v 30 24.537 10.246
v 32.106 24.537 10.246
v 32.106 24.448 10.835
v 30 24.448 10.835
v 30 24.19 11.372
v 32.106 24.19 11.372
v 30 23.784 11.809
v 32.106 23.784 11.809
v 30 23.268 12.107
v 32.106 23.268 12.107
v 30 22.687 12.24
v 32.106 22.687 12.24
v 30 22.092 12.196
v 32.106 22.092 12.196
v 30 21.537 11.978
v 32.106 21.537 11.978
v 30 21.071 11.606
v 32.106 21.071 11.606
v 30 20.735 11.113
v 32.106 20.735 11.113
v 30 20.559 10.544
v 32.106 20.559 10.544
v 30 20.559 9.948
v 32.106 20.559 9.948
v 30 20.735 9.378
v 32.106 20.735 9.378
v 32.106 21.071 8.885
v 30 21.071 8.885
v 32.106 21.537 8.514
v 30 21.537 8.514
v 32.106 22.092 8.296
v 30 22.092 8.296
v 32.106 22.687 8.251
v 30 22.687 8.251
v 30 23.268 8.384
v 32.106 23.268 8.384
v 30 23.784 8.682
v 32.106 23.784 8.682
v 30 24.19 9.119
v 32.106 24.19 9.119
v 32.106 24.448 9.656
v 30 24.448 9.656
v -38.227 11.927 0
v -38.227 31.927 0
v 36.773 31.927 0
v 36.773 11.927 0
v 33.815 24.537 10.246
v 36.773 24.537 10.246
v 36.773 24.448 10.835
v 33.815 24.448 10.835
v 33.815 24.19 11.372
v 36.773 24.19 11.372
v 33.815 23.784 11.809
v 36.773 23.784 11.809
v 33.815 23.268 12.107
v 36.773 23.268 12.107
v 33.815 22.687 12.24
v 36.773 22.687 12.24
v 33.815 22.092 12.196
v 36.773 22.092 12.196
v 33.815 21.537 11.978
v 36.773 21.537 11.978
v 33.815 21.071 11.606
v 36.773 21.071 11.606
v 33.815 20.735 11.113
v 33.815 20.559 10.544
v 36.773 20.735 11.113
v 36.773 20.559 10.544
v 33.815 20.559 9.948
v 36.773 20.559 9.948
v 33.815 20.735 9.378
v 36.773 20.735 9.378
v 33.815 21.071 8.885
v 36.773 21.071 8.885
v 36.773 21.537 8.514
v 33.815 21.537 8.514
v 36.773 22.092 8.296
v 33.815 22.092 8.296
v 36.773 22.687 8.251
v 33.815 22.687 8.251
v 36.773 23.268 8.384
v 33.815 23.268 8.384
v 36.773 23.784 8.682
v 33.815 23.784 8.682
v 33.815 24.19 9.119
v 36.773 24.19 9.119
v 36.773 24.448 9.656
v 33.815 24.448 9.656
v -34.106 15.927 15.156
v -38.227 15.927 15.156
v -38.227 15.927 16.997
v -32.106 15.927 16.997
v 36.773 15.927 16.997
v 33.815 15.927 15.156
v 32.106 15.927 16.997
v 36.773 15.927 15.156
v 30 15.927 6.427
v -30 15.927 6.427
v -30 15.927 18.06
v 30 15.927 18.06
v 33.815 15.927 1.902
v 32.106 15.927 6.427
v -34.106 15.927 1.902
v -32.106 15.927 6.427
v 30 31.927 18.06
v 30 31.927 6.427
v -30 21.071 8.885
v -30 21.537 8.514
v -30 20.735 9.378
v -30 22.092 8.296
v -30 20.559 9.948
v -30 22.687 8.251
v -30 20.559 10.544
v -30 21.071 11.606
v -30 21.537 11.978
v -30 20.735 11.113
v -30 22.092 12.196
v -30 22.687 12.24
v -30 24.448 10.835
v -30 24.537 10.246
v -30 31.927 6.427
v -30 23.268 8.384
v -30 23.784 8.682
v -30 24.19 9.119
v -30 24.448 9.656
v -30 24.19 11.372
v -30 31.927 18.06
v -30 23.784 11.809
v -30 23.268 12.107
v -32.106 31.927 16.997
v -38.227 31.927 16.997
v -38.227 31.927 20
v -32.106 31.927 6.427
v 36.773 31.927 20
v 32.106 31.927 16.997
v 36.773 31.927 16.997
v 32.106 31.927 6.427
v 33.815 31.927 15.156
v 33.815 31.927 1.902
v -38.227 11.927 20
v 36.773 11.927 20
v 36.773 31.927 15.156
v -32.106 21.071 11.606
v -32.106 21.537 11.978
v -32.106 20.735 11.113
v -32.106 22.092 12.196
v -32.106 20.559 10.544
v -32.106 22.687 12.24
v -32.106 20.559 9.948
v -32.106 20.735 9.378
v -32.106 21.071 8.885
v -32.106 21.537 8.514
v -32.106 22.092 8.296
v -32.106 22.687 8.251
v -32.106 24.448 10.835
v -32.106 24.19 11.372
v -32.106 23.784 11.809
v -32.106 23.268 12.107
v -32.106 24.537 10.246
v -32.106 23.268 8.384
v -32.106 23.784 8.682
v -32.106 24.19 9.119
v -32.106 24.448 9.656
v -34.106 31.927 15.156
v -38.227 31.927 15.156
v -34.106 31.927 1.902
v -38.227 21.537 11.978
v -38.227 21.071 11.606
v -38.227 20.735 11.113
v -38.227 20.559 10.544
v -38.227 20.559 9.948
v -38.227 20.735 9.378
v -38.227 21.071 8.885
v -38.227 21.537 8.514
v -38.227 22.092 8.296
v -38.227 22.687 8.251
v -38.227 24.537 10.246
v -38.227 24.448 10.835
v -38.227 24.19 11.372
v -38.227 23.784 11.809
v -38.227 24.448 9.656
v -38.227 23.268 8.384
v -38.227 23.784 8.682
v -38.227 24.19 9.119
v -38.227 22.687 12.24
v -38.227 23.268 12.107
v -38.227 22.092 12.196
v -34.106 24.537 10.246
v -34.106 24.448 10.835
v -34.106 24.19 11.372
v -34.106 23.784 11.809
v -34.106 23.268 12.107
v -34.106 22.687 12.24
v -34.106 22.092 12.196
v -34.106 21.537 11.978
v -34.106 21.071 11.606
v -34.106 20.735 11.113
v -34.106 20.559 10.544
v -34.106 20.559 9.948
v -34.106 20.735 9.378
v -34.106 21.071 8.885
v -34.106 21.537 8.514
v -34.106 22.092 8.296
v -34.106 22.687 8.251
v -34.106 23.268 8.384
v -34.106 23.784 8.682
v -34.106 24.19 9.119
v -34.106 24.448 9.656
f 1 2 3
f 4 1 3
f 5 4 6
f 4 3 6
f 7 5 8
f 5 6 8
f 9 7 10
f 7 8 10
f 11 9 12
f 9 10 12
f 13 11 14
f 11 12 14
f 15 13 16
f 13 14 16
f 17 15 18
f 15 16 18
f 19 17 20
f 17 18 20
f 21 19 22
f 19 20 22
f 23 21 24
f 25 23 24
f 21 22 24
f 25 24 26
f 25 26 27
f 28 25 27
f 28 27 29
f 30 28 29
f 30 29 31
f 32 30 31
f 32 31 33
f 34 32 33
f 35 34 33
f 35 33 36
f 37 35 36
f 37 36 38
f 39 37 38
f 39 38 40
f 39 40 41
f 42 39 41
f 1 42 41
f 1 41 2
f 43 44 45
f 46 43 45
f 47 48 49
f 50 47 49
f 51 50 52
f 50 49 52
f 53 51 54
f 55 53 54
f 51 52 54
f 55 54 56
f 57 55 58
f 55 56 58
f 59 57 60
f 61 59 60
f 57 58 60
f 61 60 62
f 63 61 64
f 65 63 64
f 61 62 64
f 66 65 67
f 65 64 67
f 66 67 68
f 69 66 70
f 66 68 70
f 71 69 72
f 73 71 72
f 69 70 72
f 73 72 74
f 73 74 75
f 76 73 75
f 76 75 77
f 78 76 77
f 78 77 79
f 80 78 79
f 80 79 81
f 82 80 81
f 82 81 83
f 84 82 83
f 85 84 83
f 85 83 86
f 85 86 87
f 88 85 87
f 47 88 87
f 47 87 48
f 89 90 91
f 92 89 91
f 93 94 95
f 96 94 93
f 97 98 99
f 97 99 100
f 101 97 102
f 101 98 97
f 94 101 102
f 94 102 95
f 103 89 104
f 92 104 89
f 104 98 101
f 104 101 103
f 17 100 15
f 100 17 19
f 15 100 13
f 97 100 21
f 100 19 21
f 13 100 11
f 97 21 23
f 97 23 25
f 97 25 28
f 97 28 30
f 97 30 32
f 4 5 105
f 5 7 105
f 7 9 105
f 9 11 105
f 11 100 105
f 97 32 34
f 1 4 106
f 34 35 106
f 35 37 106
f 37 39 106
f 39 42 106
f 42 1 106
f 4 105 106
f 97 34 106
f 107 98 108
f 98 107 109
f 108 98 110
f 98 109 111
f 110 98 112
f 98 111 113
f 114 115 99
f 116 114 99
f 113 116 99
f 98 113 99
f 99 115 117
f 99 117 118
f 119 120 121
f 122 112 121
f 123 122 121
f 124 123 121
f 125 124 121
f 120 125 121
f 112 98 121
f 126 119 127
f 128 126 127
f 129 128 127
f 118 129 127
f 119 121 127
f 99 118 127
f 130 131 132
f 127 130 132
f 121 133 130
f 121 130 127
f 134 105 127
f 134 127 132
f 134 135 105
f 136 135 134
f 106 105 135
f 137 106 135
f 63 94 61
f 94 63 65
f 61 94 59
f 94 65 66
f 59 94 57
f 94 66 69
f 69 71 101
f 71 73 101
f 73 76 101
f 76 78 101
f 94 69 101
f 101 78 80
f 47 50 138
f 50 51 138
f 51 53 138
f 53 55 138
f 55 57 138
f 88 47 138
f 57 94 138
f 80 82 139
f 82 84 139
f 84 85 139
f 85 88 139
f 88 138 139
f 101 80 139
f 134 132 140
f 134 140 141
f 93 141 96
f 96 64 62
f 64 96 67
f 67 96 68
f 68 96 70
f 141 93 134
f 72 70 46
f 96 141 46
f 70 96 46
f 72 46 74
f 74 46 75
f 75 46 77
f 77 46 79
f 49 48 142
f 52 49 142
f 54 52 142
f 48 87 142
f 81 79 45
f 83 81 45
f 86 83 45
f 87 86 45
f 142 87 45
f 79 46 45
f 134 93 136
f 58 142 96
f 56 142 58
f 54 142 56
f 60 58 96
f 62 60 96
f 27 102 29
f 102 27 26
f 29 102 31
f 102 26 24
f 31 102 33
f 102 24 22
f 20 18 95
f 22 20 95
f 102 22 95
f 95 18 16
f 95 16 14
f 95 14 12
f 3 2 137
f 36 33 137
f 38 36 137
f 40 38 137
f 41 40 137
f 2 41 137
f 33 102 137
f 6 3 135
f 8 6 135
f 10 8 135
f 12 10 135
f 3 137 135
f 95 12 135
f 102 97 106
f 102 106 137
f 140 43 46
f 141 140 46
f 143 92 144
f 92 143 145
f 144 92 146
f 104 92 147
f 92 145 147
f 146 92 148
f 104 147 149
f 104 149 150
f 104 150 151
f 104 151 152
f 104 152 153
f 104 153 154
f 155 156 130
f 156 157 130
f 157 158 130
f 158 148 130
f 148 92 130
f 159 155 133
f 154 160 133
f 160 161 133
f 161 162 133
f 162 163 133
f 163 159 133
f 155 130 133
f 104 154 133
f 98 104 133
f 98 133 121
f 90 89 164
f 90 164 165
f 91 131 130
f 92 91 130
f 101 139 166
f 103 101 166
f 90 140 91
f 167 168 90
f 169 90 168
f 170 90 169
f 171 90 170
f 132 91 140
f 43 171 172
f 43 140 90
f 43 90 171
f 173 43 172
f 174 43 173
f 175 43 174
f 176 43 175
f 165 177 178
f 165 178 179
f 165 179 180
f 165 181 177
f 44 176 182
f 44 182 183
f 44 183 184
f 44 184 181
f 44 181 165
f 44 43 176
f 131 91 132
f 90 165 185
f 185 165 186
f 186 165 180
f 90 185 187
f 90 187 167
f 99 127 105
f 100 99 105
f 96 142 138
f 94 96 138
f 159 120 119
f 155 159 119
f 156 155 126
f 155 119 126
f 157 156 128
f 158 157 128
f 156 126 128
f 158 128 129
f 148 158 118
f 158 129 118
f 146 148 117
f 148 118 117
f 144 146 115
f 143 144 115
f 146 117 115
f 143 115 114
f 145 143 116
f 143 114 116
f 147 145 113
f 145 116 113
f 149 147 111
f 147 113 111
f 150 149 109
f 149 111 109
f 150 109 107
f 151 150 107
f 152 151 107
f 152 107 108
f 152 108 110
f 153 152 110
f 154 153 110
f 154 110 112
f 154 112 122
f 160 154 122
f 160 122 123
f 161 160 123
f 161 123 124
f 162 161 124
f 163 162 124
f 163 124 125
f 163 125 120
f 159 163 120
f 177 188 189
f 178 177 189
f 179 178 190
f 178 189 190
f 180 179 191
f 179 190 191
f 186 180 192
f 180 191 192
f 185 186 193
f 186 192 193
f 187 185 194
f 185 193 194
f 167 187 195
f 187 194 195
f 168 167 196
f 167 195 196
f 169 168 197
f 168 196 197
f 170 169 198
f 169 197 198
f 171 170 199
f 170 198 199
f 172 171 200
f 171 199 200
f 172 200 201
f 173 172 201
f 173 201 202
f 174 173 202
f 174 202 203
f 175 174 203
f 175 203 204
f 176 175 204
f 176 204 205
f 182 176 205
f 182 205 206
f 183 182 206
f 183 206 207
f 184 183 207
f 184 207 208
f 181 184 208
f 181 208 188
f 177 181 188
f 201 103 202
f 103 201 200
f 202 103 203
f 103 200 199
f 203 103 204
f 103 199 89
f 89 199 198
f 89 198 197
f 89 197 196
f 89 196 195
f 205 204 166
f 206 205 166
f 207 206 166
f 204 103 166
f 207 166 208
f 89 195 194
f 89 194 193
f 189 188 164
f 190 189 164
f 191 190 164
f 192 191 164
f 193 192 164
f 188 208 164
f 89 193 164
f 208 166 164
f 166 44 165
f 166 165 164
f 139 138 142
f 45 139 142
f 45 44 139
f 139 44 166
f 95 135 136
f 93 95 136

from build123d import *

# Parameters (mm, degrees)
SKETCH1_W           = 75
SKETCH1_H           = 20
BOSS_EXTRUDE1_DEPTH = 20
CUT_EXTRUDE2_DEPTH  = 16
SKETCH3_R           = 2
CUT_EXTRUDE3_DEPTH  = 96


with BuildPart() as part:
    # Sketch1 → Boss-Extrude1 (new body)
    with BuildSketch(Plane.XY):
        with Locations((-0.726872247, 21.927312775)):
            Rectangle(SKETCH1_W, SKETCH1_H)
    extrude(amount=BOSS_EXTRUDE1_DEPTH)

    # Sketch2 → Cut-Extrude2 (cut)
    with BuildSketch(Plane(origin=(0, 31.927312775, 0), x_dir=(1, 0, 0), z_dir=(0, 1, 0))):
        Polygon((36.773127753, -16.997338724), (36.773127753, -15.156017778), (34.105822873, -15.156017778), (33.814685074, -15.156017778), (33.814685074, -4.376760328), (33.814685074, -1.902190301), (32.105822873, -1.902190301), (-32.105822873, -1.902190301), (-34.105822873, -1.902190301), (-34.105822873, -4.376760328), (-34.105822873, -15.156017778), (-38.226872247, -15.156017778), (-38.226872247, -16.997338724), (-32.105822873, -16.997338724), (-32.105822873, -6.427465258), (-30, -6.427465258), (-30, -18.05964209), (30, -18.05964209), (30, -6.427465258), (32.105822873, -6.427465258), (32.105822873, -16.997338724), align=None)
    extrude(amount=-CUT_EXTRUDE2_DEPTH, mode=Mode.SUBTRACT)

    # Sketch3 → Cut-Extrude3 (cut)
    with BuildSketch(Plane(origin=(36.773127753, 0, 0), x_dir=(0, 0, -1), z_dir=(1, 0, 0))):
        with Locations(Location((-10.245692038, 22.537083277, 0), (0, 0, 90))):
            Circle(SKETCH3_R)
    extrude(amount=-CUT_EXTRUDE3_DEPTH, mode=Mode.SUBTRACT)


solid = part.part
